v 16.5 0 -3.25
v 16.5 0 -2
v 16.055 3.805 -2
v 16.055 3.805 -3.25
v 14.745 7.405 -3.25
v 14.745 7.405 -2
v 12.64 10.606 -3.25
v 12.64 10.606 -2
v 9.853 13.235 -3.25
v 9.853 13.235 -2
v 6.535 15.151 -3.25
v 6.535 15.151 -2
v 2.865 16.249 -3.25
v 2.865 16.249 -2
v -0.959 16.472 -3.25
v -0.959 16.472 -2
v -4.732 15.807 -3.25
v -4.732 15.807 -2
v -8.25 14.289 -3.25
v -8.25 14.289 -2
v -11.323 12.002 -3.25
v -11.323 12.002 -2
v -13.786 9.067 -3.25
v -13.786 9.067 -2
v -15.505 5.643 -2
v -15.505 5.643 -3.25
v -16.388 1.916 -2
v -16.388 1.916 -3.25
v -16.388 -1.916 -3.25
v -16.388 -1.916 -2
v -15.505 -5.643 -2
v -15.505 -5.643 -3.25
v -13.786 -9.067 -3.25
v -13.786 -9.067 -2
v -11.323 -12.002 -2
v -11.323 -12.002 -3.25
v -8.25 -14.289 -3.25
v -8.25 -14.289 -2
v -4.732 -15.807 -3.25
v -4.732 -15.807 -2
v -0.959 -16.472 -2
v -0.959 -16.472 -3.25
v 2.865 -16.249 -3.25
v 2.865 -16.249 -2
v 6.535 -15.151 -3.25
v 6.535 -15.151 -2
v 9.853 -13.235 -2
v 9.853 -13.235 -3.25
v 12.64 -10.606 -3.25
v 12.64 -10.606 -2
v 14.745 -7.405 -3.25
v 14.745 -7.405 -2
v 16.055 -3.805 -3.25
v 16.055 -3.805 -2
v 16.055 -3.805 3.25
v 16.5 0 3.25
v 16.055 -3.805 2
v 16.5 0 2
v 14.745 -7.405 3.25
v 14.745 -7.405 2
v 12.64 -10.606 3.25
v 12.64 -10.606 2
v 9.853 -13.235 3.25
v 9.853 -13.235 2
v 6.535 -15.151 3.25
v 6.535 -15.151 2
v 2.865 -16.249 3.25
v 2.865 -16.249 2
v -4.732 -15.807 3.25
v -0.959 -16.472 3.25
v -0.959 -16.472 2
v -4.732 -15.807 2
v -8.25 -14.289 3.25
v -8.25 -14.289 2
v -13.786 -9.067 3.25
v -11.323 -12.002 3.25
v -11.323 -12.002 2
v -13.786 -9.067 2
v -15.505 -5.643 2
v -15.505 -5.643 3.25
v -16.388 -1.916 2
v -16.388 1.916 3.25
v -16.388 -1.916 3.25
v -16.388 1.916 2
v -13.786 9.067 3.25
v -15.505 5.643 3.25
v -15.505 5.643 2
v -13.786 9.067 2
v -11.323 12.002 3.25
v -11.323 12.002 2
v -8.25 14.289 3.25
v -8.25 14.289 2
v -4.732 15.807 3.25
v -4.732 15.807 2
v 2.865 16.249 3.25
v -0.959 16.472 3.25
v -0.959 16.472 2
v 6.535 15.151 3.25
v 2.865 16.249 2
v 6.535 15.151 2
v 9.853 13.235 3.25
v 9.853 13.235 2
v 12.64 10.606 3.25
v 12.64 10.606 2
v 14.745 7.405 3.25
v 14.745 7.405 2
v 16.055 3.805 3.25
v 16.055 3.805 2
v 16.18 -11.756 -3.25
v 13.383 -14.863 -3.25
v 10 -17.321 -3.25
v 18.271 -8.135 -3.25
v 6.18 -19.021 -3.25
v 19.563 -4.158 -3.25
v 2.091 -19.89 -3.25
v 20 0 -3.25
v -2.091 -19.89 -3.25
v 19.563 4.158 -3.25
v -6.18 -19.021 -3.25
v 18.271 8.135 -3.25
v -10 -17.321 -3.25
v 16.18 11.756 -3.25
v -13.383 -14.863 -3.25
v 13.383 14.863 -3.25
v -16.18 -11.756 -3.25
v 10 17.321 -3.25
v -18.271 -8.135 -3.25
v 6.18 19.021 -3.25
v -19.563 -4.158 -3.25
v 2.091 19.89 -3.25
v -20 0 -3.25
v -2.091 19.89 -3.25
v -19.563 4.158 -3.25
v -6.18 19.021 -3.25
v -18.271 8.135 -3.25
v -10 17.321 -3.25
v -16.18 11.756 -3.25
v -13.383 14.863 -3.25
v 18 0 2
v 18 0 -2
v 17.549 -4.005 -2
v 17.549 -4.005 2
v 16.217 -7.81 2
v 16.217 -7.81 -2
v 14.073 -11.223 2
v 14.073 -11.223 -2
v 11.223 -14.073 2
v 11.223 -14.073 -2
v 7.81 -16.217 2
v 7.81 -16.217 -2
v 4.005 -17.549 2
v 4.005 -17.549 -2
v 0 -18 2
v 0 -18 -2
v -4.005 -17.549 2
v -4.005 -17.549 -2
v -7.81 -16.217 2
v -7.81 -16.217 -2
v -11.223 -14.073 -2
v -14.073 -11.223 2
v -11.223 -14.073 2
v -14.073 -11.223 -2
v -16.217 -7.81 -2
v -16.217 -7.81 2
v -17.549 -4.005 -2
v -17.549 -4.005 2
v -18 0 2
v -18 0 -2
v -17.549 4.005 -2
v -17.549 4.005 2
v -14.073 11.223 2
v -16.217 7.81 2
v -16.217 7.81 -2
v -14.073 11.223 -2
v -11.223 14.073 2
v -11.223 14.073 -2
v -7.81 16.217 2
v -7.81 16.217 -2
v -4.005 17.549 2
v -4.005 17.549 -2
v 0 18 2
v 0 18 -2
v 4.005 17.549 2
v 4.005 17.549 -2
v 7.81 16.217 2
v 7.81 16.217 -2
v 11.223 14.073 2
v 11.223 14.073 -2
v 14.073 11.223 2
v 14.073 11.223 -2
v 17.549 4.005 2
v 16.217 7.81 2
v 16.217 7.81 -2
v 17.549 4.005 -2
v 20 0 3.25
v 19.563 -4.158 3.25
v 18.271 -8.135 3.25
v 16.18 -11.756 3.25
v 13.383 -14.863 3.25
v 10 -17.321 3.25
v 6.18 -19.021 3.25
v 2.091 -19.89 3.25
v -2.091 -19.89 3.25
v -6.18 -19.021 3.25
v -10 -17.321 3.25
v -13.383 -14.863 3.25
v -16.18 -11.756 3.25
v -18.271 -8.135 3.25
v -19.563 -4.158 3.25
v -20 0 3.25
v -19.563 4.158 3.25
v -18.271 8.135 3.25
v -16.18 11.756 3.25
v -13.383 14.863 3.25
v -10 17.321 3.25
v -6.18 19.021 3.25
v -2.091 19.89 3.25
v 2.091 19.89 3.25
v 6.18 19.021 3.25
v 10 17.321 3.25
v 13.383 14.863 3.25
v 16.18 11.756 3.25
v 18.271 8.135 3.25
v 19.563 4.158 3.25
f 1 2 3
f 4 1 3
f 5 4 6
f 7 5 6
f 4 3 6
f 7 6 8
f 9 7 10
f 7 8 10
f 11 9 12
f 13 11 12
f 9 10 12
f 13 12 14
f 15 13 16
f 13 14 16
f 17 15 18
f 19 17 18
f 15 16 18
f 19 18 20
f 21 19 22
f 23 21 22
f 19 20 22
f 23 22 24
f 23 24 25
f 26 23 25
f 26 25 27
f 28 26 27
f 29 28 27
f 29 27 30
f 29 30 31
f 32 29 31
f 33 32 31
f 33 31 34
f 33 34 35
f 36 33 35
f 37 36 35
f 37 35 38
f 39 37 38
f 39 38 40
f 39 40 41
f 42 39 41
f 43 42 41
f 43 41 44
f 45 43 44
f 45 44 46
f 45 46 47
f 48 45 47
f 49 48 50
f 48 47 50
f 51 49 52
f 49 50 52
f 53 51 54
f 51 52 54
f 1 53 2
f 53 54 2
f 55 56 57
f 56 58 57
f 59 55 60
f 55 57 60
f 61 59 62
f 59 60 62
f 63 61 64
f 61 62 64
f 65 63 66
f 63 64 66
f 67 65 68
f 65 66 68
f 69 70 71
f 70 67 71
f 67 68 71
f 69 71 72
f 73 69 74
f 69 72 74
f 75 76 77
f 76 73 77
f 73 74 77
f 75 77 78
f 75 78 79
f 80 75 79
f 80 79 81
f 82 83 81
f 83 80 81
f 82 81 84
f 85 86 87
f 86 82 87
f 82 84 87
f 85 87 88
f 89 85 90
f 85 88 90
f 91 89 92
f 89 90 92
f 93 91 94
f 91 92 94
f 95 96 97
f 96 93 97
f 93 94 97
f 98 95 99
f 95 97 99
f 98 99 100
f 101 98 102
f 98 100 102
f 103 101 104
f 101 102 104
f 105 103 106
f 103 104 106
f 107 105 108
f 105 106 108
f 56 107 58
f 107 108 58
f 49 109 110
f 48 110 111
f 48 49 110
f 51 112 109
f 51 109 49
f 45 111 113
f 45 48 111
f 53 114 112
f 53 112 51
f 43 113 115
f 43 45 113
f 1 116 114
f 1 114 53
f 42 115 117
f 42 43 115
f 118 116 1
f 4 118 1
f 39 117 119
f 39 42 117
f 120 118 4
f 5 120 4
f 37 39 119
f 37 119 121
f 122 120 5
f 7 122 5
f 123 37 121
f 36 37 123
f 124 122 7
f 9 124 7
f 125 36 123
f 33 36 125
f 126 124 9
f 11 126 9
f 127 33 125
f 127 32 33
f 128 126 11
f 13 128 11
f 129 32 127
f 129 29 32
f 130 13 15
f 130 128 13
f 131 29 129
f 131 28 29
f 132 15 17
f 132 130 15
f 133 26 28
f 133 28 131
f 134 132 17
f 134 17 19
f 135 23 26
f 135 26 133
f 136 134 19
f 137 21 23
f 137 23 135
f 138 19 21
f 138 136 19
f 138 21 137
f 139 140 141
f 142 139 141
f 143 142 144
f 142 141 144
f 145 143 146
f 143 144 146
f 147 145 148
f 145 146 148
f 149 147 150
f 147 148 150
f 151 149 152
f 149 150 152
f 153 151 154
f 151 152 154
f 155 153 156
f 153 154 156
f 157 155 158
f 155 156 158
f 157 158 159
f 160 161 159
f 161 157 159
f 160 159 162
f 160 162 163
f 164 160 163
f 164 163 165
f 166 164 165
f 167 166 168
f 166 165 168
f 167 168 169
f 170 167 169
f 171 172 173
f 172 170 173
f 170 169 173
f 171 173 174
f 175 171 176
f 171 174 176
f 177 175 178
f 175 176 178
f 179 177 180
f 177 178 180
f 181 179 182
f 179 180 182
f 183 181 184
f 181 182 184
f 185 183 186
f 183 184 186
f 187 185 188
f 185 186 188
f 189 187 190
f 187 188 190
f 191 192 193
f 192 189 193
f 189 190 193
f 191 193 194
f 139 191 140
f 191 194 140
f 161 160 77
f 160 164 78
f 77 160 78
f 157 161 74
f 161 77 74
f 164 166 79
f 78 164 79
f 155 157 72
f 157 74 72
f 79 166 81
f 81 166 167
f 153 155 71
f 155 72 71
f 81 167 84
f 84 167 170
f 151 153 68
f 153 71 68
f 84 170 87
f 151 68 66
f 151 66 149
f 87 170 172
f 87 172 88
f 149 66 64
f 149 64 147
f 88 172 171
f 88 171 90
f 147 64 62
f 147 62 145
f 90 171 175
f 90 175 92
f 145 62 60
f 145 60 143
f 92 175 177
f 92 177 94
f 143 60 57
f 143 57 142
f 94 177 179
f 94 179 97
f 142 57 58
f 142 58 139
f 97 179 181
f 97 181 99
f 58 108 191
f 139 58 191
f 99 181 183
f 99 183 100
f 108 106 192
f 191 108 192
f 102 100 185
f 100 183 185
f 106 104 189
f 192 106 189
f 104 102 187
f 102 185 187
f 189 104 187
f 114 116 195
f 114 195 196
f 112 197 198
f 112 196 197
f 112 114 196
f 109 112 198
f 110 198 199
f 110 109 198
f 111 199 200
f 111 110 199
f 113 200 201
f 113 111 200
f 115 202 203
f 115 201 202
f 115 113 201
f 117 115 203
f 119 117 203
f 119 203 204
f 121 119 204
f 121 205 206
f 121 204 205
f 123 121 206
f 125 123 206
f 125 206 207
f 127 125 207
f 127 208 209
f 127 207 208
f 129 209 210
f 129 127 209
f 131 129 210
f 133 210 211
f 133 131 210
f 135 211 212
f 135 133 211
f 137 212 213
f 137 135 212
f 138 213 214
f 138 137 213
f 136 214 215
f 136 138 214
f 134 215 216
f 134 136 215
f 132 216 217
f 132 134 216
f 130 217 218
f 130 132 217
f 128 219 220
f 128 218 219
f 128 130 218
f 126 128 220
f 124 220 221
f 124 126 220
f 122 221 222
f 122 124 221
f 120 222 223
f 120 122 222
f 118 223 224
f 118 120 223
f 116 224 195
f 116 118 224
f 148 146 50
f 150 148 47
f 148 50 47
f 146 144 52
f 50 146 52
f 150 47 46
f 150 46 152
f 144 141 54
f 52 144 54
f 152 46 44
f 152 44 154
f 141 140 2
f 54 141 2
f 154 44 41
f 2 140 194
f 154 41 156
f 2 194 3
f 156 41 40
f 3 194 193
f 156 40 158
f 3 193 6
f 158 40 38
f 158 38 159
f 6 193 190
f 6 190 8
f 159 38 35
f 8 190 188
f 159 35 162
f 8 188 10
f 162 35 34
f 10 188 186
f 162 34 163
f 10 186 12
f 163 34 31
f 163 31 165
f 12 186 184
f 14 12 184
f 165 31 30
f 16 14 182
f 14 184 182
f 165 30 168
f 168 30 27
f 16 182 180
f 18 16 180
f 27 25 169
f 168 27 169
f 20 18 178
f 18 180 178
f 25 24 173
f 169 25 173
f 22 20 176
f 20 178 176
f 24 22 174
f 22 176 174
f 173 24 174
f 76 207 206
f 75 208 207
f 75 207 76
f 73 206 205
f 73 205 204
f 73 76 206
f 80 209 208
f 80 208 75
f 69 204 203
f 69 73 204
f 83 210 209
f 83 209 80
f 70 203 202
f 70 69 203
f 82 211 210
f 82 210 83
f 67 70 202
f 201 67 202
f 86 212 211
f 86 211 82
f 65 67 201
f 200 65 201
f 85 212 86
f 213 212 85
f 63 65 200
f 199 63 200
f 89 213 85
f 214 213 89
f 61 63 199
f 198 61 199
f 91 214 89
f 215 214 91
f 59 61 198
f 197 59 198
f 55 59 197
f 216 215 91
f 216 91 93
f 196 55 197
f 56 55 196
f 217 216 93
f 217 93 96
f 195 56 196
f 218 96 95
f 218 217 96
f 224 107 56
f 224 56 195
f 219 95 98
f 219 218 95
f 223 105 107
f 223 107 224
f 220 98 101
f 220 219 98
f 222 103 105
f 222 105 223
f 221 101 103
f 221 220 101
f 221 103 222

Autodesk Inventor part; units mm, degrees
ref_plane "YZ Plane" through (0, 0, 0) normal (1, 0, 0) x (0, 1, 0)
ref_plane "XZ Plane" through (0, 0, 0) normal (0, 1, 0) x (-1, 0, 0)
ref_plane "XY Plane" through (0, 0, 0) normal (0, 0, 1) x (1, 0, 0)
sketch "Эскиз1" plane through (0, 0, 0) normal (0, 0, 1) x (1, 0, 0)
  circle A0 centre (0, 0) radius 18
  circle A1 centre (0, 0) radius 20
  dimension "d0" = 36
  dimension "d1" = 40
extrude "Выдавливание1" add sketch "Эскиз1" along normal blind 2
sketch "Эскиз2" plane through (0, 0, 2) normal (0, 0, 1) x (1, 0, 0)
  circle A0 centre (0, 0) radius 20 projected
  circle A1 centre (0, 0) radius 16.5
  dimension "d4" = 33
extrude "Выдавливание2" add sketch "Эскиз2" along normal blind 1.25
mirror "Зеркальное отражение1" about plane through (0, 0, 0) normal (0, 0, -1)
properties part number "Шина колеса D40"
